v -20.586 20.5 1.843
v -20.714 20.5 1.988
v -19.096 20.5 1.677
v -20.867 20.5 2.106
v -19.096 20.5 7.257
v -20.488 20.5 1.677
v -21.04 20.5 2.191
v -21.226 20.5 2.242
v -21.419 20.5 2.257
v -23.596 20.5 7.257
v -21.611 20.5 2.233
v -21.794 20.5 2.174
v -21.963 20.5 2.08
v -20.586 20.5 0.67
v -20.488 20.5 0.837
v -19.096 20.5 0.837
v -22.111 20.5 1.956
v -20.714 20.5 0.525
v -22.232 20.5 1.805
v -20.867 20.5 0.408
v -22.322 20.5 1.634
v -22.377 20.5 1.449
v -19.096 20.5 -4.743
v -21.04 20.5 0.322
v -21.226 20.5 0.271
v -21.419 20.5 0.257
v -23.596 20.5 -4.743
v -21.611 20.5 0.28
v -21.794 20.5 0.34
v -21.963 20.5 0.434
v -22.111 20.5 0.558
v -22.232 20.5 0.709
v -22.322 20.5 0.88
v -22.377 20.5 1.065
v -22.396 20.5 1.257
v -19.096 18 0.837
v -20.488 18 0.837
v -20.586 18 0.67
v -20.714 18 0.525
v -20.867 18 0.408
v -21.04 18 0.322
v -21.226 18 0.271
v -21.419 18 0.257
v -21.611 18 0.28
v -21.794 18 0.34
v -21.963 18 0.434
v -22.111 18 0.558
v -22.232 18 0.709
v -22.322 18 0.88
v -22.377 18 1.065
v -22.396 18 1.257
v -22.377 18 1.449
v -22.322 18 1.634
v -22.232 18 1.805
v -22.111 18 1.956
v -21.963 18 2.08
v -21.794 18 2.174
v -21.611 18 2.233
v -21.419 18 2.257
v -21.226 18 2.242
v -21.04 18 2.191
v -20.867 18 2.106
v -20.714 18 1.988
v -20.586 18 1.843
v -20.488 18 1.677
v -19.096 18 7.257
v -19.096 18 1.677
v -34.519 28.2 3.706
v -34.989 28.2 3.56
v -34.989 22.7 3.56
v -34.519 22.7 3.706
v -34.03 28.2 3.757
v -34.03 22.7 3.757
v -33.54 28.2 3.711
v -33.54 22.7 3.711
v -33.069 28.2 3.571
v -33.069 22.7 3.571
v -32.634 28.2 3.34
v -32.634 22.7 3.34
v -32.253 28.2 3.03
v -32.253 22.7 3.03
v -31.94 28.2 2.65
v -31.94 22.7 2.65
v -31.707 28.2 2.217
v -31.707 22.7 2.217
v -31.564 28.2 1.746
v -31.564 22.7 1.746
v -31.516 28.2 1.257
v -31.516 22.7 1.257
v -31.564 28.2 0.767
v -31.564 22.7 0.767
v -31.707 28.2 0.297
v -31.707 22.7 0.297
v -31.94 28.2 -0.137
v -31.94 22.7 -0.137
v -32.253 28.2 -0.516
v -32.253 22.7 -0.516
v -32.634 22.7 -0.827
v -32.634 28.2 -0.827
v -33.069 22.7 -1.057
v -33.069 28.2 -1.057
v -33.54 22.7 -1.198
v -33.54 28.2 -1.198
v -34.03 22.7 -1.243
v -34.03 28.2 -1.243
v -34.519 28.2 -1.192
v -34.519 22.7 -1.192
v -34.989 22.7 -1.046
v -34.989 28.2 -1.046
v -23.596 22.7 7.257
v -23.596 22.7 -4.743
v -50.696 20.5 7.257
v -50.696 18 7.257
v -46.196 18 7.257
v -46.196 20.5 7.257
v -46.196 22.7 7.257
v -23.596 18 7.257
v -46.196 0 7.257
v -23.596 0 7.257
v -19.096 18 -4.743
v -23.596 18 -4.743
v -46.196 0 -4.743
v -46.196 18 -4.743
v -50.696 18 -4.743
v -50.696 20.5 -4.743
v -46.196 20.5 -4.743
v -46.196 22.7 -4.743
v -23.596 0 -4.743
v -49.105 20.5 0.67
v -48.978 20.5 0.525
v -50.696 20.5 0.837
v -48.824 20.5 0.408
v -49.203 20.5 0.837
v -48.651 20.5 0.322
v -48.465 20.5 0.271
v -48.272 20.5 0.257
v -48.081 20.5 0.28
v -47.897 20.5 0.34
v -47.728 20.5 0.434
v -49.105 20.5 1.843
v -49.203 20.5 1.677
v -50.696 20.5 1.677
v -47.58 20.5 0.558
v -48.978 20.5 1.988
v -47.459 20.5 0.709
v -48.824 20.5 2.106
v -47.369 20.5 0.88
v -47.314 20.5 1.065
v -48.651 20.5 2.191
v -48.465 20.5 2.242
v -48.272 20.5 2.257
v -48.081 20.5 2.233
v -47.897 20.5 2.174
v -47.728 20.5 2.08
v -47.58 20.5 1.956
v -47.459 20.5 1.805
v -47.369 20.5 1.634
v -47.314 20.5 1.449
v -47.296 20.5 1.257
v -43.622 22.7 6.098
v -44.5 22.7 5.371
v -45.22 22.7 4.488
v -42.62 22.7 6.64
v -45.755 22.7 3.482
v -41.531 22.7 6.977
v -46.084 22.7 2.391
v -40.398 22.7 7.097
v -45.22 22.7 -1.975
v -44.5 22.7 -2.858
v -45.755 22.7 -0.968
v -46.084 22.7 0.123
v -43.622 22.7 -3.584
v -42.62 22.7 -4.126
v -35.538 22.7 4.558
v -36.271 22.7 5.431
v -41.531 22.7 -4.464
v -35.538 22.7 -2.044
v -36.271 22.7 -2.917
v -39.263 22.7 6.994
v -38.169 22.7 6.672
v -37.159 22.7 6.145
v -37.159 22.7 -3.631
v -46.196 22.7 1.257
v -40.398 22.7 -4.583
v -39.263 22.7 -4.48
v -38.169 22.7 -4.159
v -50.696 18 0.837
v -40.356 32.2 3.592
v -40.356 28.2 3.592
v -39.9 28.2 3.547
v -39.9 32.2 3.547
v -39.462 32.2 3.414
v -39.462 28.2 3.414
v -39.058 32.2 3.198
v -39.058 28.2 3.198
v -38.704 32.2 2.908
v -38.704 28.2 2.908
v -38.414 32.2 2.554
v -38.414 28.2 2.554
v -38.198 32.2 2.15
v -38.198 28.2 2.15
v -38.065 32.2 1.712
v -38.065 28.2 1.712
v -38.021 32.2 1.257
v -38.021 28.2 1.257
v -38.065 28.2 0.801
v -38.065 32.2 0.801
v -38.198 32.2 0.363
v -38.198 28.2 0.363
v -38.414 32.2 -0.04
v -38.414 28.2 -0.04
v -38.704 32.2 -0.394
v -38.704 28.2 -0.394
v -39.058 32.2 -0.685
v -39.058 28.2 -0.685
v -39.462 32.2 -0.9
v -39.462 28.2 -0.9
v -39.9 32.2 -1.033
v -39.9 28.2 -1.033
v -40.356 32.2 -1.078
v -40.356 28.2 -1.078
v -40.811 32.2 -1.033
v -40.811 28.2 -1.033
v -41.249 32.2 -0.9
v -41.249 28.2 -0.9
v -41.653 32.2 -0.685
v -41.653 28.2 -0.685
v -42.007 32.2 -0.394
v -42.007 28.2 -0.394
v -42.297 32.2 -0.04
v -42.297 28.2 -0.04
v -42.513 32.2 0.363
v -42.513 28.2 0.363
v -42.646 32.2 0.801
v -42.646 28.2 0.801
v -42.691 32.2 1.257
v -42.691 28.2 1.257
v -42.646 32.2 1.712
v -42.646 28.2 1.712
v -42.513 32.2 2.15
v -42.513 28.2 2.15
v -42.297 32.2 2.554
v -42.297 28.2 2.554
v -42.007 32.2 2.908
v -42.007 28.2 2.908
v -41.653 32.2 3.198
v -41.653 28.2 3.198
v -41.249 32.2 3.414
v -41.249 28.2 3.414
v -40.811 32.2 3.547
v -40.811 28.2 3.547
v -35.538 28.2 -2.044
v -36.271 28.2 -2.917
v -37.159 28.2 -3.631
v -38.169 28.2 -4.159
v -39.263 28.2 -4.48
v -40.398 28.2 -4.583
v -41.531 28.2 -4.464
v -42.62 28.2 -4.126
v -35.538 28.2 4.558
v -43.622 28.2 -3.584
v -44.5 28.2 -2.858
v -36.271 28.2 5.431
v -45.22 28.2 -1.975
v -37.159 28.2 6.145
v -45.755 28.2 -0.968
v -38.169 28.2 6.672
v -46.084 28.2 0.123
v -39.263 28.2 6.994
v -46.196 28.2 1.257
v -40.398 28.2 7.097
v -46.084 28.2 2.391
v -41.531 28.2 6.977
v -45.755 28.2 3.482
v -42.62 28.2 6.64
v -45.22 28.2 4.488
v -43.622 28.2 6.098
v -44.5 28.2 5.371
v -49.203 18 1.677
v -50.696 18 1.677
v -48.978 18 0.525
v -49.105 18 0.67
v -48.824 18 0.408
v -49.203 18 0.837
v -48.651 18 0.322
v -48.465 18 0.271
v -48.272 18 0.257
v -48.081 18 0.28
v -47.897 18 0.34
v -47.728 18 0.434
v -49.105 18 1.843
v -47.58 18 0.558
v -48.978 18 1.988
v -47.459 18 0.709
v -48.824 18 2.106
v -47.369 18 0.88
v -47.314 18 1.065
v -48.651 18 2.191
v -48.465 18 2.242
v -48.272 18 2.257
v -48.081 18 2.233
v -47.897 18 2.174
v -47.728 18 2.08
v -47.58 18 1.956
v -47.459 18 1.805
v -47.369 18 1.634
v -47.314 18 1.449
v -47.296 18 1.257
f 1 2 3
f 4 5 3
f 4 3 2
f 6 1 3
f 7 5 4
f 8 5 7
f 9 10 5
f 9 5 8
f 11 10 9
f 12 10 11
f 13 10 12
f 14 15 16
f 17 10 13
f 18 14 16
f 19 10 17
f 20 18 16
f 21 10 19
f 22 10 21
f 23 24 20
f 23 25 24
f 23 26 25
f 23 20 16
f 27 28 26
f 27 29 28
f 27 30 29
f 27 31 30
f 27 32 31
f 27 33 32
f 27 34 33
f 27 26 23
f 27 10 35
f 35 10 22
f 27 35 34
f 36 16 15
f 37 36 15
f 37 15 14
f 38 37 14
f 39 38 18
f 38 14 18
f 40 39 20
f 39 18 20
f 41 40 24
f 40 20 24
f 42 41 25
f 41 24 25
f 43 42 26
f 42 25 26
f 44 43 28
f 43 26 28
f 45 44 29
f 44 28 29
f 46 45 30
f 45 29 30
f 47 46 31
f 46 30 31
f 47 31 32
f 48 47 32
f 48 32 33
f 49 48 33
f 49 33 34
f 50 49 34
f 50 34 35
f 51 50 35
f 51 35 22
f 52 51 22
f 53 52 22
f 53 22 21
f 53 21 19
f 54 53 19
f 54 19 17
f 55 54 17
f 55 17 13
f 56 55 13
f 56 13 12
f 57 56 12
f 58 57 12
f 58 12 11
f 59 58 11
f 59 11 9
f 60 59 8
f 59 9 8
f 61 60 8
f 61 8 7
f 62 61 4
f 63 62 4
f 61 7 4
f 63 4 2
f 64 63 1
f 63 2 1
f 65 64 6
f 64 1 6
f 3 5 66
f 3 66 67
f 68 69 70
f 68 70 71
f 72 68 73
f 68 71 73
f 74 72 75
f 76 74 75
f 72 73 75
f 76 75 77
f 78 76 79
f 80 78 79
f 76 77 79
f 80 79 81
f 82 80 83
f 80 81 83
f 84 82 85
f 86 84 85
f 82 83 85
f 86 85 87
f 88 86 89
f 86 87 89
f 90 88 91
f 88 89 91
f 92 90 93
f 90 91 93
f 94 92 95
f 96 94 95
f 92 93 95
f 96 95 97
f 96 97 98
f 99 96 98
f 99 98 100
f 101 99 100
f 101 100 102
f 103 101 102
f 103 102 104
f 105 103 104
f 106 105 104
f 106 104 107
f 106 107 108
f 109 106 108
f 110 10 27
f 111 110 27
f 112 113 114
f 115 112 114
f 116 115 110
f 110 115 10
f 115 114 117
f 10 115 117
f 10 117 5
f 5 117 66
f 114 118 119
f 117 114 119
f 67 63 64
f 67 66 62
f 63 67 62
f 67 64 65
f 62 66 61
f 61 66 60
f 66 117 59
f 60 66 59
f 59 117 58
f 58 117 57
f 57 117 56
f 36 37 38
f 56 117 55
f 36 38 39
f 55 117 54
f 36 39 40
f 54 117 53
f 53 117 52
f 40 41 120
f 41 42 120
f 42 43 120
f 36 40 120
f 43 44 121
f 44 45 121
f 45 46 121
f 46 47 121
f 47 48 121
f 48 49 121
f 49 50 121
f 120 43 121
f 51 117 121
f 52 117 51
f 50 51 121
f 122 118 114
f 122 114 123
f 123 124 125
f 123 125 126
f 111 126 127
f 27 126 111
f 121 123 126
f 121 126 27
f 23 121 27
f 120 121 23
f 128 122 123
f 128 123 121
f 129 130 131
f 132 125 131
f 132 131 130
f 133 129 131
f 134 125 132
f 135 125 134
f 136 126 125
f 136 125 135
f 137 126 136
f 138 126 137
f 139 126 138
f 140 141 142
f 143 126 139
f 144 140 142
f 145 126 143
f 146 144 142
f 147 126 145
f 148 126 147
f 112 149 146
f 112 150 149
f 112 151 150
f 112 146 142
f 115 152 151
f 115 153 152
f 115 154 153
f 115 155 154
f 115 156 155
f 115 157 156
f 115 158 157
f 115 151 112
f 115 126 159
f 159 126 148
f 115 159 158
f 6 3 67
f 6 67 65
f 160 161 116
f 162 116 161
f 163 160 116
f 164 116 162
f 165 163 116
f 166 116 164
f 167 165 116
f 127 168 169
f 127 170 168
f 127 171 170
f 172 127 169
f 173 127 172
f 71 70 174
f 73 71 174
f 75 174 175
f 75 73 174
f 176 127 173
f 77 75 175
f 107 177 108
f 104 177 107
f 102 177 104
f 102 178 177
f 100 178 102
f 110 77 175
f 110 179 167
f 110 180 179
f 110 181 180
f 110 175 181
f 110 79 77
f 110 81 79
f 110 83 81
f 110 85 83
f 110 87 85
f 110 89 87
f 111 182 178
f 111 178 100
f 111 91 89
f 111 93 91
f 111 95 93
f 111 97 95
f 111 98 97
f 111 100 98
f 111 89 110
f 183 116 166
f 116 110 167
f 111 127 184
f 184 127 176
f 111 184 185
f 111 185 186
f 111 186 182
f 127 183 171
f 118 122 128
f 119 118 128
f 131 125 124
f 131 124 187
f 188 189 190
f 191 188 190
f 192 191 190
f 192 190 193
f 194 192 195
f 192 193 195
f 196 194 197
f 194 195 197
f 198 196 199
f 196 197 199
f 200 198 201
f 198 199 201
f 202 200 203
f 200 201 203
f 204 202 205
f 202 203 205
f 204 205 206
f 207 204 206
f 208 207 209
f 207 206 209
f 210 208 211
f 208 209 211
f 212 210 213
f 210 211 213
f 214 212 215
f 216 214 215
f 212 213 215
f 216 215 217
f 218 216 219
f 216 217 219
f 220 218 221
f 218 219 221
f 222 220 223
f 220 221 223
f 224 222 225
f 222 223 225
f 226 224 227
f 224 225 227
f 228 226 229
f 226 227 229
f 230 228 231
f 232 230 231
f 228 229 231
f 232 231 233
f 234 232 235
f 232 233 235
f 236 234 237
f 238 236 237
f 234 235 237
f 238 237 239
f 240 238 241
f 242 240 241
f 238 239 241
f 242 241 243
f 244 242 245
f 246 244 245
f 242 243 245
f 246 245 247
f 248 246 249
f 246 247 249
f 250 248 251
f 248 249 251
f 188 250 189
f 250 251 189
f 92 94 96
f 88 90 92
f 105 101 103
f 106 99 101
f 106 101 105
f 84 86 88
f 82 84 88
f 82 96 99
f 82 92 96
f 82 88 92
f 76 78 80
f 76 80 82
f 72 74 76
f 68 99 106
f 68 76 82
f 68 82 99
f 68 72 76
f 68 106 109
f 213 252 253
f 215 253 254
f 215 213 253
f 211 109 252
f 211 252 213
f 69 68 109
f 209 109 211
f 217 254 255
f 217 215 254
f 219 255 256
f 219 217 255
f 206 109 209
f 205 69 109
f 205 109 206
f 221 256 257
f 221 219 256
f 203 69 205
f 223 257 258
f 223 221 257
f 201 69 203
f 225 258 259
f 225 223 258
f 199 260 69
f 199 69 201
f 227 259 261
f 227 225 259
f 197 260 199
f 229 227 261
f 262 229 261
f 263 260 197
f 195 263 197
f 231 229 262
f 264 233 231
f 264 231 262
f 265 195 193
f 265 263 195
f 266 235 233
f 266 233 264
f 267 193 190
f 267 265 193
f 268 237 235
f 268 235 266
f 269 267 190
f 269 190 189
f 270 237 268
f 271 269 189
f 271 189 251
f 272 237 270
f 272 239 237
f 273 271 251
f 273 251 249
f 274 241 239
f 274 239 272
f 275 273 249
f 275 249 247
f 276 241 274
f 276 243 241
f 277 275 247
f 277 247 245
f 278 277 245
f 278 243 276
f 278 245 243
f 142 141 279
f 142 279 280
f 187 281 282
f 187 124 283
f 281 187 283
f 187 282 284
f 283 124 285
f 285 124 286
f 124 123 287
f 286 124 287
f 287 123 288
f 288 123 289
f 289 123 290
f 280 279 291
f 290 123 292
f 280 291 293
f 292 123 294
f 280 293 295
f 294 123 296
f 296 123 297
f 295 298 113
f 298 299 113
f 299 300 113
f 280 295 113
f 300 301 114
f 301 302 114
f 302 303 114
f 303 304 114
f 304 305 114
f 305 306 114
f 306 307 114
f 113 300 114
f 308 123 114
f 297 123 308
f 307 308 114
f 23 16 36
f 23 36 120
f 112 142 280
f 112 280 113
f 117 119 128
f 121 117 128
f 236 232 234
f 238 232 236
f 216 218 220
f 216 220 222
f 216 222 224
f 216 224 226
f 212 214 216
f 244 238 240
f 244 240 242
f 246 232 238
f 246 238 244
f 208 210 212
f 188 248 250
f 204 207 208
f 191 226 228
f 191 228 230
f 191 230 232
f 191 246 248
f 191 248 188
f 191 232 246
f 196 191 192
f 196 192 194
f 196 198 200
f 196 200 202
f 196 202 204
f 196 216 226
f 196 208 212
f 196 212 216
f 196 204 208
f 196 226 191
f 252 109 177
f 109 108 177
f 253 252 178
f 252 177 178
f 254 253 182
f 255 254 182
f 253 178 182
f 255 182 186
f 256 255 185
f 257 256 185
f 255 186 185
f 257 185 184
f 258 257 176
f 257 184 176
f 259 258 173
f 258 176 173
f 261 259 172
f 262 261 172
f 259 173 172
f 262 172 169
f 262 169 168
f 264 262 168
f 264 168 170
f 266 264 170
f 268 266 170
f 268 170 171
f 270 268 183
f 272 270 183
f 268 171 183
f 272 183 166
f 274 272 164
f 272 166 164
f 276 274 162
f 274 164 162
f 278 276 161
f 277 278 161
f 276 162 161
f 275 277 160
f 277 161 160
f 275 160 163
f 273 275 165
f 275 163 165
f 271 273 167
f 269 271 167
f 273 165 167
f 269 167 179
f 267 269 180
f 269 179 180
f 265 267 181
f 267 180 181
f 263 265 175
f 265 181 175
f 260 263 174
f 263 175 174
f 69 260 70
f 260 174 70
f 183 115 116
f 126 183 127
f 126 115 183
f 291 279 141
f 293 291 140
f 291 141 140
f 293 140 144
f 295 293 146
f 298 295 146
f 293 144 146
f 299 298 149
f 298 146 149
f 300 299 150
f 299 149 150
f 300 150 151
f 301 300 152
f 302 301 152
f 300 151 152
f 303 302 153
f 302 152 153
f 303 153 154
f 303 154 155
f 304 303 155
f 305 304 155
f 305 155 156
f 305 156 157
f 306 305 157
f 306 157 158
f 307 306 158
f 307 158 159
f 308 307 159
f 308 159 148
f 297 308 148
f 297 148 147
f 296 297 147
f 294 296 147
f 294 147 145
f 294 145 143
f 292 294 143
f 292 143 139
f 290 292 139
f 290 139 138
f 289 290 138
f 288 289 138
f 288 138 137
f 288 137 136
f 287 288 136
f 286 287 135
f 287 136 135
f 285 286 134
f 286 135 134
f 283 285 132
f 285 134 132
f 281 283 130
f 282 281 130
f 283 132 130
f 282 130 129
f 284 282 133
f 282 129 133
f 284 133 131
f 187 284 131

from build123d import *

# Parameters (mm, degrees)
SKETCH1_W            = 22.6
SKETCH1_H            = 12
BOSS_EXTRUDE1_DEPTH  = 22.7
SKETCH4_R            = 5.84
BOSS_EXTRUDE6_DEPTH  = 5.5
SKETCH12_R           = 2.335
BOSS_EXTRUDE7_DEPTH  = 4
SKETCH13_R           = 2.5
BOSS_EXTRUDE8_DEPTH  = 5.5
SKETCH14_W           = 12
SKETCH14_H           = 2.5
BOSS_EXTRUDE10_DEPTH = 4.5
SKETCH15_R           = 1
SKETCH15_W           = 1.5
SKETCH15_H           = 0.84
CUT_EXTRUDE3_DEPTH   = 52.05819482
SKETCH16_W           = 12
SKETCH16_H           = 2.5
BOSS_EXTRUDE11_DEPTH = 4.5
SKETCH17_R           = 1
SKETCH17_W           = 1.5
SKETCH17_H           = 0.84
CUT_EXTRUDE4_DEPTH   = 56.162931847


with BuildPart() as part:
    # Sketch1 → Boss-Extrude1 (new body)
    with BuildSketch(Plane(origin=(0, 0, 0), x_dir=(1, 0, 0), z_dir=(0, 1, 0))):
        with Locations((-34.895532414, -1.256861806)):
            Rectangle(SKETCH1_W, SKETCH1_H)
    extrude(amount=BOSS_EXTRUDE1_DEPTH)

    # Sketch4 → Boss-Extrude6 (add)
    with BuildSketch(Plane(origin=(0, 22.7, 0), x_dir=(-1, 0, 0), z_dir=(0, 1, 0))):
        with Locations((40.355532414, 1.256861806)):
            Circle(SKETCH4_R)
    extrude(amount=BOSS_EXTRUDE6_DEPTH)

    # Sketch12 → Boss-Extrude7 (add)
    with BuildSketch(Plane(origin=(0, 28.2, 0), x_dir=(-1, 0, 0), z_dir=(0, 1, 0))):
        with Locations(Location((40.355532414, 1.256861806, 0), (0, 0, 90))):
            Circle(SKETCH12_R)
    extrude(amount=BOSS_EXTRUDE7_DEPTH)

    # Sketch13 → Boss-Extrude8 (add)
    with BuildSketch(Plane(origin=(0, 22.7, 0), x_dir=(-1, 0, 0), z_dir=(0, 1, 0))):
        with Locations((34.015532414, 1.256861806)):
            Circle(SKETCH13_R)
    extrude(amount=BOSS_EXTRUDE8_DEPTH)

    # Sketch14 → Boss-Extrude10 (add)
    with BuildSketch(Plane(origin=(-23.595532414, 0, 0), x_dir=(0, 0, -1), z_dir=(1, 0, 0))):
        with Locations((-1.256861806, 19.25)):
            Rectangle(SKETCH14_W, SKETCH14_H)
    extrude(amount=BOSS_EXTRUDE10_DEPTH)

    # Sketch15 → Cut-Extrude3 (cut, through all)
    with BuildSketch(Plane(origin=(0, 20.5, 0), x_dir=(-1, 0, 0), z_dir=(0, 1, 0))):
        with Locations((21.395532414, 1.256861806)):
            Circle(SKETCH15_R)
        with Locations((48.395532414, 1.256861806)):
            Circle(SKETCH15_R)
        with Locations((19.845532414, 1.256861806)):
            Rectangle(SKETCH15_W, SKETCH15_H)
    extrude(amount=-CUT_EXTRUDE3_DEPTH, mode=Mode.SUBTRACT)

    # Sketch16 → Boss-Extrude11 (add)
    with BuildSketch(Plane.ZY.offset(46.195532414)):
        with Locations((1.256861806, 19.25)):
            Rectangle(SKETCH16_W, SKETCH16_H)
    extrude(amount=BOSS_EXTRUDE11_DEPTH)

    # Sketch17 → Cut-Extrude4 (cut, through all)
    with BuildSketch(Plane(origin=(0, 20.5, 0), x_dir=(-1, 0, 0), z_dir=(0, 1, 0))):
        with Locations((48.295532414, 1.256861806)):
            Circle(SKETCH17_R)
        with Locations((49.945532414, 1.256861806)):
            Rectangle(SKETCH17_W, SKETCH17_H)
    extrude(amount=-CUT_EXTRUDE4_DEPTH, mode=Mode.SUBTRACT)


solid = part.part
